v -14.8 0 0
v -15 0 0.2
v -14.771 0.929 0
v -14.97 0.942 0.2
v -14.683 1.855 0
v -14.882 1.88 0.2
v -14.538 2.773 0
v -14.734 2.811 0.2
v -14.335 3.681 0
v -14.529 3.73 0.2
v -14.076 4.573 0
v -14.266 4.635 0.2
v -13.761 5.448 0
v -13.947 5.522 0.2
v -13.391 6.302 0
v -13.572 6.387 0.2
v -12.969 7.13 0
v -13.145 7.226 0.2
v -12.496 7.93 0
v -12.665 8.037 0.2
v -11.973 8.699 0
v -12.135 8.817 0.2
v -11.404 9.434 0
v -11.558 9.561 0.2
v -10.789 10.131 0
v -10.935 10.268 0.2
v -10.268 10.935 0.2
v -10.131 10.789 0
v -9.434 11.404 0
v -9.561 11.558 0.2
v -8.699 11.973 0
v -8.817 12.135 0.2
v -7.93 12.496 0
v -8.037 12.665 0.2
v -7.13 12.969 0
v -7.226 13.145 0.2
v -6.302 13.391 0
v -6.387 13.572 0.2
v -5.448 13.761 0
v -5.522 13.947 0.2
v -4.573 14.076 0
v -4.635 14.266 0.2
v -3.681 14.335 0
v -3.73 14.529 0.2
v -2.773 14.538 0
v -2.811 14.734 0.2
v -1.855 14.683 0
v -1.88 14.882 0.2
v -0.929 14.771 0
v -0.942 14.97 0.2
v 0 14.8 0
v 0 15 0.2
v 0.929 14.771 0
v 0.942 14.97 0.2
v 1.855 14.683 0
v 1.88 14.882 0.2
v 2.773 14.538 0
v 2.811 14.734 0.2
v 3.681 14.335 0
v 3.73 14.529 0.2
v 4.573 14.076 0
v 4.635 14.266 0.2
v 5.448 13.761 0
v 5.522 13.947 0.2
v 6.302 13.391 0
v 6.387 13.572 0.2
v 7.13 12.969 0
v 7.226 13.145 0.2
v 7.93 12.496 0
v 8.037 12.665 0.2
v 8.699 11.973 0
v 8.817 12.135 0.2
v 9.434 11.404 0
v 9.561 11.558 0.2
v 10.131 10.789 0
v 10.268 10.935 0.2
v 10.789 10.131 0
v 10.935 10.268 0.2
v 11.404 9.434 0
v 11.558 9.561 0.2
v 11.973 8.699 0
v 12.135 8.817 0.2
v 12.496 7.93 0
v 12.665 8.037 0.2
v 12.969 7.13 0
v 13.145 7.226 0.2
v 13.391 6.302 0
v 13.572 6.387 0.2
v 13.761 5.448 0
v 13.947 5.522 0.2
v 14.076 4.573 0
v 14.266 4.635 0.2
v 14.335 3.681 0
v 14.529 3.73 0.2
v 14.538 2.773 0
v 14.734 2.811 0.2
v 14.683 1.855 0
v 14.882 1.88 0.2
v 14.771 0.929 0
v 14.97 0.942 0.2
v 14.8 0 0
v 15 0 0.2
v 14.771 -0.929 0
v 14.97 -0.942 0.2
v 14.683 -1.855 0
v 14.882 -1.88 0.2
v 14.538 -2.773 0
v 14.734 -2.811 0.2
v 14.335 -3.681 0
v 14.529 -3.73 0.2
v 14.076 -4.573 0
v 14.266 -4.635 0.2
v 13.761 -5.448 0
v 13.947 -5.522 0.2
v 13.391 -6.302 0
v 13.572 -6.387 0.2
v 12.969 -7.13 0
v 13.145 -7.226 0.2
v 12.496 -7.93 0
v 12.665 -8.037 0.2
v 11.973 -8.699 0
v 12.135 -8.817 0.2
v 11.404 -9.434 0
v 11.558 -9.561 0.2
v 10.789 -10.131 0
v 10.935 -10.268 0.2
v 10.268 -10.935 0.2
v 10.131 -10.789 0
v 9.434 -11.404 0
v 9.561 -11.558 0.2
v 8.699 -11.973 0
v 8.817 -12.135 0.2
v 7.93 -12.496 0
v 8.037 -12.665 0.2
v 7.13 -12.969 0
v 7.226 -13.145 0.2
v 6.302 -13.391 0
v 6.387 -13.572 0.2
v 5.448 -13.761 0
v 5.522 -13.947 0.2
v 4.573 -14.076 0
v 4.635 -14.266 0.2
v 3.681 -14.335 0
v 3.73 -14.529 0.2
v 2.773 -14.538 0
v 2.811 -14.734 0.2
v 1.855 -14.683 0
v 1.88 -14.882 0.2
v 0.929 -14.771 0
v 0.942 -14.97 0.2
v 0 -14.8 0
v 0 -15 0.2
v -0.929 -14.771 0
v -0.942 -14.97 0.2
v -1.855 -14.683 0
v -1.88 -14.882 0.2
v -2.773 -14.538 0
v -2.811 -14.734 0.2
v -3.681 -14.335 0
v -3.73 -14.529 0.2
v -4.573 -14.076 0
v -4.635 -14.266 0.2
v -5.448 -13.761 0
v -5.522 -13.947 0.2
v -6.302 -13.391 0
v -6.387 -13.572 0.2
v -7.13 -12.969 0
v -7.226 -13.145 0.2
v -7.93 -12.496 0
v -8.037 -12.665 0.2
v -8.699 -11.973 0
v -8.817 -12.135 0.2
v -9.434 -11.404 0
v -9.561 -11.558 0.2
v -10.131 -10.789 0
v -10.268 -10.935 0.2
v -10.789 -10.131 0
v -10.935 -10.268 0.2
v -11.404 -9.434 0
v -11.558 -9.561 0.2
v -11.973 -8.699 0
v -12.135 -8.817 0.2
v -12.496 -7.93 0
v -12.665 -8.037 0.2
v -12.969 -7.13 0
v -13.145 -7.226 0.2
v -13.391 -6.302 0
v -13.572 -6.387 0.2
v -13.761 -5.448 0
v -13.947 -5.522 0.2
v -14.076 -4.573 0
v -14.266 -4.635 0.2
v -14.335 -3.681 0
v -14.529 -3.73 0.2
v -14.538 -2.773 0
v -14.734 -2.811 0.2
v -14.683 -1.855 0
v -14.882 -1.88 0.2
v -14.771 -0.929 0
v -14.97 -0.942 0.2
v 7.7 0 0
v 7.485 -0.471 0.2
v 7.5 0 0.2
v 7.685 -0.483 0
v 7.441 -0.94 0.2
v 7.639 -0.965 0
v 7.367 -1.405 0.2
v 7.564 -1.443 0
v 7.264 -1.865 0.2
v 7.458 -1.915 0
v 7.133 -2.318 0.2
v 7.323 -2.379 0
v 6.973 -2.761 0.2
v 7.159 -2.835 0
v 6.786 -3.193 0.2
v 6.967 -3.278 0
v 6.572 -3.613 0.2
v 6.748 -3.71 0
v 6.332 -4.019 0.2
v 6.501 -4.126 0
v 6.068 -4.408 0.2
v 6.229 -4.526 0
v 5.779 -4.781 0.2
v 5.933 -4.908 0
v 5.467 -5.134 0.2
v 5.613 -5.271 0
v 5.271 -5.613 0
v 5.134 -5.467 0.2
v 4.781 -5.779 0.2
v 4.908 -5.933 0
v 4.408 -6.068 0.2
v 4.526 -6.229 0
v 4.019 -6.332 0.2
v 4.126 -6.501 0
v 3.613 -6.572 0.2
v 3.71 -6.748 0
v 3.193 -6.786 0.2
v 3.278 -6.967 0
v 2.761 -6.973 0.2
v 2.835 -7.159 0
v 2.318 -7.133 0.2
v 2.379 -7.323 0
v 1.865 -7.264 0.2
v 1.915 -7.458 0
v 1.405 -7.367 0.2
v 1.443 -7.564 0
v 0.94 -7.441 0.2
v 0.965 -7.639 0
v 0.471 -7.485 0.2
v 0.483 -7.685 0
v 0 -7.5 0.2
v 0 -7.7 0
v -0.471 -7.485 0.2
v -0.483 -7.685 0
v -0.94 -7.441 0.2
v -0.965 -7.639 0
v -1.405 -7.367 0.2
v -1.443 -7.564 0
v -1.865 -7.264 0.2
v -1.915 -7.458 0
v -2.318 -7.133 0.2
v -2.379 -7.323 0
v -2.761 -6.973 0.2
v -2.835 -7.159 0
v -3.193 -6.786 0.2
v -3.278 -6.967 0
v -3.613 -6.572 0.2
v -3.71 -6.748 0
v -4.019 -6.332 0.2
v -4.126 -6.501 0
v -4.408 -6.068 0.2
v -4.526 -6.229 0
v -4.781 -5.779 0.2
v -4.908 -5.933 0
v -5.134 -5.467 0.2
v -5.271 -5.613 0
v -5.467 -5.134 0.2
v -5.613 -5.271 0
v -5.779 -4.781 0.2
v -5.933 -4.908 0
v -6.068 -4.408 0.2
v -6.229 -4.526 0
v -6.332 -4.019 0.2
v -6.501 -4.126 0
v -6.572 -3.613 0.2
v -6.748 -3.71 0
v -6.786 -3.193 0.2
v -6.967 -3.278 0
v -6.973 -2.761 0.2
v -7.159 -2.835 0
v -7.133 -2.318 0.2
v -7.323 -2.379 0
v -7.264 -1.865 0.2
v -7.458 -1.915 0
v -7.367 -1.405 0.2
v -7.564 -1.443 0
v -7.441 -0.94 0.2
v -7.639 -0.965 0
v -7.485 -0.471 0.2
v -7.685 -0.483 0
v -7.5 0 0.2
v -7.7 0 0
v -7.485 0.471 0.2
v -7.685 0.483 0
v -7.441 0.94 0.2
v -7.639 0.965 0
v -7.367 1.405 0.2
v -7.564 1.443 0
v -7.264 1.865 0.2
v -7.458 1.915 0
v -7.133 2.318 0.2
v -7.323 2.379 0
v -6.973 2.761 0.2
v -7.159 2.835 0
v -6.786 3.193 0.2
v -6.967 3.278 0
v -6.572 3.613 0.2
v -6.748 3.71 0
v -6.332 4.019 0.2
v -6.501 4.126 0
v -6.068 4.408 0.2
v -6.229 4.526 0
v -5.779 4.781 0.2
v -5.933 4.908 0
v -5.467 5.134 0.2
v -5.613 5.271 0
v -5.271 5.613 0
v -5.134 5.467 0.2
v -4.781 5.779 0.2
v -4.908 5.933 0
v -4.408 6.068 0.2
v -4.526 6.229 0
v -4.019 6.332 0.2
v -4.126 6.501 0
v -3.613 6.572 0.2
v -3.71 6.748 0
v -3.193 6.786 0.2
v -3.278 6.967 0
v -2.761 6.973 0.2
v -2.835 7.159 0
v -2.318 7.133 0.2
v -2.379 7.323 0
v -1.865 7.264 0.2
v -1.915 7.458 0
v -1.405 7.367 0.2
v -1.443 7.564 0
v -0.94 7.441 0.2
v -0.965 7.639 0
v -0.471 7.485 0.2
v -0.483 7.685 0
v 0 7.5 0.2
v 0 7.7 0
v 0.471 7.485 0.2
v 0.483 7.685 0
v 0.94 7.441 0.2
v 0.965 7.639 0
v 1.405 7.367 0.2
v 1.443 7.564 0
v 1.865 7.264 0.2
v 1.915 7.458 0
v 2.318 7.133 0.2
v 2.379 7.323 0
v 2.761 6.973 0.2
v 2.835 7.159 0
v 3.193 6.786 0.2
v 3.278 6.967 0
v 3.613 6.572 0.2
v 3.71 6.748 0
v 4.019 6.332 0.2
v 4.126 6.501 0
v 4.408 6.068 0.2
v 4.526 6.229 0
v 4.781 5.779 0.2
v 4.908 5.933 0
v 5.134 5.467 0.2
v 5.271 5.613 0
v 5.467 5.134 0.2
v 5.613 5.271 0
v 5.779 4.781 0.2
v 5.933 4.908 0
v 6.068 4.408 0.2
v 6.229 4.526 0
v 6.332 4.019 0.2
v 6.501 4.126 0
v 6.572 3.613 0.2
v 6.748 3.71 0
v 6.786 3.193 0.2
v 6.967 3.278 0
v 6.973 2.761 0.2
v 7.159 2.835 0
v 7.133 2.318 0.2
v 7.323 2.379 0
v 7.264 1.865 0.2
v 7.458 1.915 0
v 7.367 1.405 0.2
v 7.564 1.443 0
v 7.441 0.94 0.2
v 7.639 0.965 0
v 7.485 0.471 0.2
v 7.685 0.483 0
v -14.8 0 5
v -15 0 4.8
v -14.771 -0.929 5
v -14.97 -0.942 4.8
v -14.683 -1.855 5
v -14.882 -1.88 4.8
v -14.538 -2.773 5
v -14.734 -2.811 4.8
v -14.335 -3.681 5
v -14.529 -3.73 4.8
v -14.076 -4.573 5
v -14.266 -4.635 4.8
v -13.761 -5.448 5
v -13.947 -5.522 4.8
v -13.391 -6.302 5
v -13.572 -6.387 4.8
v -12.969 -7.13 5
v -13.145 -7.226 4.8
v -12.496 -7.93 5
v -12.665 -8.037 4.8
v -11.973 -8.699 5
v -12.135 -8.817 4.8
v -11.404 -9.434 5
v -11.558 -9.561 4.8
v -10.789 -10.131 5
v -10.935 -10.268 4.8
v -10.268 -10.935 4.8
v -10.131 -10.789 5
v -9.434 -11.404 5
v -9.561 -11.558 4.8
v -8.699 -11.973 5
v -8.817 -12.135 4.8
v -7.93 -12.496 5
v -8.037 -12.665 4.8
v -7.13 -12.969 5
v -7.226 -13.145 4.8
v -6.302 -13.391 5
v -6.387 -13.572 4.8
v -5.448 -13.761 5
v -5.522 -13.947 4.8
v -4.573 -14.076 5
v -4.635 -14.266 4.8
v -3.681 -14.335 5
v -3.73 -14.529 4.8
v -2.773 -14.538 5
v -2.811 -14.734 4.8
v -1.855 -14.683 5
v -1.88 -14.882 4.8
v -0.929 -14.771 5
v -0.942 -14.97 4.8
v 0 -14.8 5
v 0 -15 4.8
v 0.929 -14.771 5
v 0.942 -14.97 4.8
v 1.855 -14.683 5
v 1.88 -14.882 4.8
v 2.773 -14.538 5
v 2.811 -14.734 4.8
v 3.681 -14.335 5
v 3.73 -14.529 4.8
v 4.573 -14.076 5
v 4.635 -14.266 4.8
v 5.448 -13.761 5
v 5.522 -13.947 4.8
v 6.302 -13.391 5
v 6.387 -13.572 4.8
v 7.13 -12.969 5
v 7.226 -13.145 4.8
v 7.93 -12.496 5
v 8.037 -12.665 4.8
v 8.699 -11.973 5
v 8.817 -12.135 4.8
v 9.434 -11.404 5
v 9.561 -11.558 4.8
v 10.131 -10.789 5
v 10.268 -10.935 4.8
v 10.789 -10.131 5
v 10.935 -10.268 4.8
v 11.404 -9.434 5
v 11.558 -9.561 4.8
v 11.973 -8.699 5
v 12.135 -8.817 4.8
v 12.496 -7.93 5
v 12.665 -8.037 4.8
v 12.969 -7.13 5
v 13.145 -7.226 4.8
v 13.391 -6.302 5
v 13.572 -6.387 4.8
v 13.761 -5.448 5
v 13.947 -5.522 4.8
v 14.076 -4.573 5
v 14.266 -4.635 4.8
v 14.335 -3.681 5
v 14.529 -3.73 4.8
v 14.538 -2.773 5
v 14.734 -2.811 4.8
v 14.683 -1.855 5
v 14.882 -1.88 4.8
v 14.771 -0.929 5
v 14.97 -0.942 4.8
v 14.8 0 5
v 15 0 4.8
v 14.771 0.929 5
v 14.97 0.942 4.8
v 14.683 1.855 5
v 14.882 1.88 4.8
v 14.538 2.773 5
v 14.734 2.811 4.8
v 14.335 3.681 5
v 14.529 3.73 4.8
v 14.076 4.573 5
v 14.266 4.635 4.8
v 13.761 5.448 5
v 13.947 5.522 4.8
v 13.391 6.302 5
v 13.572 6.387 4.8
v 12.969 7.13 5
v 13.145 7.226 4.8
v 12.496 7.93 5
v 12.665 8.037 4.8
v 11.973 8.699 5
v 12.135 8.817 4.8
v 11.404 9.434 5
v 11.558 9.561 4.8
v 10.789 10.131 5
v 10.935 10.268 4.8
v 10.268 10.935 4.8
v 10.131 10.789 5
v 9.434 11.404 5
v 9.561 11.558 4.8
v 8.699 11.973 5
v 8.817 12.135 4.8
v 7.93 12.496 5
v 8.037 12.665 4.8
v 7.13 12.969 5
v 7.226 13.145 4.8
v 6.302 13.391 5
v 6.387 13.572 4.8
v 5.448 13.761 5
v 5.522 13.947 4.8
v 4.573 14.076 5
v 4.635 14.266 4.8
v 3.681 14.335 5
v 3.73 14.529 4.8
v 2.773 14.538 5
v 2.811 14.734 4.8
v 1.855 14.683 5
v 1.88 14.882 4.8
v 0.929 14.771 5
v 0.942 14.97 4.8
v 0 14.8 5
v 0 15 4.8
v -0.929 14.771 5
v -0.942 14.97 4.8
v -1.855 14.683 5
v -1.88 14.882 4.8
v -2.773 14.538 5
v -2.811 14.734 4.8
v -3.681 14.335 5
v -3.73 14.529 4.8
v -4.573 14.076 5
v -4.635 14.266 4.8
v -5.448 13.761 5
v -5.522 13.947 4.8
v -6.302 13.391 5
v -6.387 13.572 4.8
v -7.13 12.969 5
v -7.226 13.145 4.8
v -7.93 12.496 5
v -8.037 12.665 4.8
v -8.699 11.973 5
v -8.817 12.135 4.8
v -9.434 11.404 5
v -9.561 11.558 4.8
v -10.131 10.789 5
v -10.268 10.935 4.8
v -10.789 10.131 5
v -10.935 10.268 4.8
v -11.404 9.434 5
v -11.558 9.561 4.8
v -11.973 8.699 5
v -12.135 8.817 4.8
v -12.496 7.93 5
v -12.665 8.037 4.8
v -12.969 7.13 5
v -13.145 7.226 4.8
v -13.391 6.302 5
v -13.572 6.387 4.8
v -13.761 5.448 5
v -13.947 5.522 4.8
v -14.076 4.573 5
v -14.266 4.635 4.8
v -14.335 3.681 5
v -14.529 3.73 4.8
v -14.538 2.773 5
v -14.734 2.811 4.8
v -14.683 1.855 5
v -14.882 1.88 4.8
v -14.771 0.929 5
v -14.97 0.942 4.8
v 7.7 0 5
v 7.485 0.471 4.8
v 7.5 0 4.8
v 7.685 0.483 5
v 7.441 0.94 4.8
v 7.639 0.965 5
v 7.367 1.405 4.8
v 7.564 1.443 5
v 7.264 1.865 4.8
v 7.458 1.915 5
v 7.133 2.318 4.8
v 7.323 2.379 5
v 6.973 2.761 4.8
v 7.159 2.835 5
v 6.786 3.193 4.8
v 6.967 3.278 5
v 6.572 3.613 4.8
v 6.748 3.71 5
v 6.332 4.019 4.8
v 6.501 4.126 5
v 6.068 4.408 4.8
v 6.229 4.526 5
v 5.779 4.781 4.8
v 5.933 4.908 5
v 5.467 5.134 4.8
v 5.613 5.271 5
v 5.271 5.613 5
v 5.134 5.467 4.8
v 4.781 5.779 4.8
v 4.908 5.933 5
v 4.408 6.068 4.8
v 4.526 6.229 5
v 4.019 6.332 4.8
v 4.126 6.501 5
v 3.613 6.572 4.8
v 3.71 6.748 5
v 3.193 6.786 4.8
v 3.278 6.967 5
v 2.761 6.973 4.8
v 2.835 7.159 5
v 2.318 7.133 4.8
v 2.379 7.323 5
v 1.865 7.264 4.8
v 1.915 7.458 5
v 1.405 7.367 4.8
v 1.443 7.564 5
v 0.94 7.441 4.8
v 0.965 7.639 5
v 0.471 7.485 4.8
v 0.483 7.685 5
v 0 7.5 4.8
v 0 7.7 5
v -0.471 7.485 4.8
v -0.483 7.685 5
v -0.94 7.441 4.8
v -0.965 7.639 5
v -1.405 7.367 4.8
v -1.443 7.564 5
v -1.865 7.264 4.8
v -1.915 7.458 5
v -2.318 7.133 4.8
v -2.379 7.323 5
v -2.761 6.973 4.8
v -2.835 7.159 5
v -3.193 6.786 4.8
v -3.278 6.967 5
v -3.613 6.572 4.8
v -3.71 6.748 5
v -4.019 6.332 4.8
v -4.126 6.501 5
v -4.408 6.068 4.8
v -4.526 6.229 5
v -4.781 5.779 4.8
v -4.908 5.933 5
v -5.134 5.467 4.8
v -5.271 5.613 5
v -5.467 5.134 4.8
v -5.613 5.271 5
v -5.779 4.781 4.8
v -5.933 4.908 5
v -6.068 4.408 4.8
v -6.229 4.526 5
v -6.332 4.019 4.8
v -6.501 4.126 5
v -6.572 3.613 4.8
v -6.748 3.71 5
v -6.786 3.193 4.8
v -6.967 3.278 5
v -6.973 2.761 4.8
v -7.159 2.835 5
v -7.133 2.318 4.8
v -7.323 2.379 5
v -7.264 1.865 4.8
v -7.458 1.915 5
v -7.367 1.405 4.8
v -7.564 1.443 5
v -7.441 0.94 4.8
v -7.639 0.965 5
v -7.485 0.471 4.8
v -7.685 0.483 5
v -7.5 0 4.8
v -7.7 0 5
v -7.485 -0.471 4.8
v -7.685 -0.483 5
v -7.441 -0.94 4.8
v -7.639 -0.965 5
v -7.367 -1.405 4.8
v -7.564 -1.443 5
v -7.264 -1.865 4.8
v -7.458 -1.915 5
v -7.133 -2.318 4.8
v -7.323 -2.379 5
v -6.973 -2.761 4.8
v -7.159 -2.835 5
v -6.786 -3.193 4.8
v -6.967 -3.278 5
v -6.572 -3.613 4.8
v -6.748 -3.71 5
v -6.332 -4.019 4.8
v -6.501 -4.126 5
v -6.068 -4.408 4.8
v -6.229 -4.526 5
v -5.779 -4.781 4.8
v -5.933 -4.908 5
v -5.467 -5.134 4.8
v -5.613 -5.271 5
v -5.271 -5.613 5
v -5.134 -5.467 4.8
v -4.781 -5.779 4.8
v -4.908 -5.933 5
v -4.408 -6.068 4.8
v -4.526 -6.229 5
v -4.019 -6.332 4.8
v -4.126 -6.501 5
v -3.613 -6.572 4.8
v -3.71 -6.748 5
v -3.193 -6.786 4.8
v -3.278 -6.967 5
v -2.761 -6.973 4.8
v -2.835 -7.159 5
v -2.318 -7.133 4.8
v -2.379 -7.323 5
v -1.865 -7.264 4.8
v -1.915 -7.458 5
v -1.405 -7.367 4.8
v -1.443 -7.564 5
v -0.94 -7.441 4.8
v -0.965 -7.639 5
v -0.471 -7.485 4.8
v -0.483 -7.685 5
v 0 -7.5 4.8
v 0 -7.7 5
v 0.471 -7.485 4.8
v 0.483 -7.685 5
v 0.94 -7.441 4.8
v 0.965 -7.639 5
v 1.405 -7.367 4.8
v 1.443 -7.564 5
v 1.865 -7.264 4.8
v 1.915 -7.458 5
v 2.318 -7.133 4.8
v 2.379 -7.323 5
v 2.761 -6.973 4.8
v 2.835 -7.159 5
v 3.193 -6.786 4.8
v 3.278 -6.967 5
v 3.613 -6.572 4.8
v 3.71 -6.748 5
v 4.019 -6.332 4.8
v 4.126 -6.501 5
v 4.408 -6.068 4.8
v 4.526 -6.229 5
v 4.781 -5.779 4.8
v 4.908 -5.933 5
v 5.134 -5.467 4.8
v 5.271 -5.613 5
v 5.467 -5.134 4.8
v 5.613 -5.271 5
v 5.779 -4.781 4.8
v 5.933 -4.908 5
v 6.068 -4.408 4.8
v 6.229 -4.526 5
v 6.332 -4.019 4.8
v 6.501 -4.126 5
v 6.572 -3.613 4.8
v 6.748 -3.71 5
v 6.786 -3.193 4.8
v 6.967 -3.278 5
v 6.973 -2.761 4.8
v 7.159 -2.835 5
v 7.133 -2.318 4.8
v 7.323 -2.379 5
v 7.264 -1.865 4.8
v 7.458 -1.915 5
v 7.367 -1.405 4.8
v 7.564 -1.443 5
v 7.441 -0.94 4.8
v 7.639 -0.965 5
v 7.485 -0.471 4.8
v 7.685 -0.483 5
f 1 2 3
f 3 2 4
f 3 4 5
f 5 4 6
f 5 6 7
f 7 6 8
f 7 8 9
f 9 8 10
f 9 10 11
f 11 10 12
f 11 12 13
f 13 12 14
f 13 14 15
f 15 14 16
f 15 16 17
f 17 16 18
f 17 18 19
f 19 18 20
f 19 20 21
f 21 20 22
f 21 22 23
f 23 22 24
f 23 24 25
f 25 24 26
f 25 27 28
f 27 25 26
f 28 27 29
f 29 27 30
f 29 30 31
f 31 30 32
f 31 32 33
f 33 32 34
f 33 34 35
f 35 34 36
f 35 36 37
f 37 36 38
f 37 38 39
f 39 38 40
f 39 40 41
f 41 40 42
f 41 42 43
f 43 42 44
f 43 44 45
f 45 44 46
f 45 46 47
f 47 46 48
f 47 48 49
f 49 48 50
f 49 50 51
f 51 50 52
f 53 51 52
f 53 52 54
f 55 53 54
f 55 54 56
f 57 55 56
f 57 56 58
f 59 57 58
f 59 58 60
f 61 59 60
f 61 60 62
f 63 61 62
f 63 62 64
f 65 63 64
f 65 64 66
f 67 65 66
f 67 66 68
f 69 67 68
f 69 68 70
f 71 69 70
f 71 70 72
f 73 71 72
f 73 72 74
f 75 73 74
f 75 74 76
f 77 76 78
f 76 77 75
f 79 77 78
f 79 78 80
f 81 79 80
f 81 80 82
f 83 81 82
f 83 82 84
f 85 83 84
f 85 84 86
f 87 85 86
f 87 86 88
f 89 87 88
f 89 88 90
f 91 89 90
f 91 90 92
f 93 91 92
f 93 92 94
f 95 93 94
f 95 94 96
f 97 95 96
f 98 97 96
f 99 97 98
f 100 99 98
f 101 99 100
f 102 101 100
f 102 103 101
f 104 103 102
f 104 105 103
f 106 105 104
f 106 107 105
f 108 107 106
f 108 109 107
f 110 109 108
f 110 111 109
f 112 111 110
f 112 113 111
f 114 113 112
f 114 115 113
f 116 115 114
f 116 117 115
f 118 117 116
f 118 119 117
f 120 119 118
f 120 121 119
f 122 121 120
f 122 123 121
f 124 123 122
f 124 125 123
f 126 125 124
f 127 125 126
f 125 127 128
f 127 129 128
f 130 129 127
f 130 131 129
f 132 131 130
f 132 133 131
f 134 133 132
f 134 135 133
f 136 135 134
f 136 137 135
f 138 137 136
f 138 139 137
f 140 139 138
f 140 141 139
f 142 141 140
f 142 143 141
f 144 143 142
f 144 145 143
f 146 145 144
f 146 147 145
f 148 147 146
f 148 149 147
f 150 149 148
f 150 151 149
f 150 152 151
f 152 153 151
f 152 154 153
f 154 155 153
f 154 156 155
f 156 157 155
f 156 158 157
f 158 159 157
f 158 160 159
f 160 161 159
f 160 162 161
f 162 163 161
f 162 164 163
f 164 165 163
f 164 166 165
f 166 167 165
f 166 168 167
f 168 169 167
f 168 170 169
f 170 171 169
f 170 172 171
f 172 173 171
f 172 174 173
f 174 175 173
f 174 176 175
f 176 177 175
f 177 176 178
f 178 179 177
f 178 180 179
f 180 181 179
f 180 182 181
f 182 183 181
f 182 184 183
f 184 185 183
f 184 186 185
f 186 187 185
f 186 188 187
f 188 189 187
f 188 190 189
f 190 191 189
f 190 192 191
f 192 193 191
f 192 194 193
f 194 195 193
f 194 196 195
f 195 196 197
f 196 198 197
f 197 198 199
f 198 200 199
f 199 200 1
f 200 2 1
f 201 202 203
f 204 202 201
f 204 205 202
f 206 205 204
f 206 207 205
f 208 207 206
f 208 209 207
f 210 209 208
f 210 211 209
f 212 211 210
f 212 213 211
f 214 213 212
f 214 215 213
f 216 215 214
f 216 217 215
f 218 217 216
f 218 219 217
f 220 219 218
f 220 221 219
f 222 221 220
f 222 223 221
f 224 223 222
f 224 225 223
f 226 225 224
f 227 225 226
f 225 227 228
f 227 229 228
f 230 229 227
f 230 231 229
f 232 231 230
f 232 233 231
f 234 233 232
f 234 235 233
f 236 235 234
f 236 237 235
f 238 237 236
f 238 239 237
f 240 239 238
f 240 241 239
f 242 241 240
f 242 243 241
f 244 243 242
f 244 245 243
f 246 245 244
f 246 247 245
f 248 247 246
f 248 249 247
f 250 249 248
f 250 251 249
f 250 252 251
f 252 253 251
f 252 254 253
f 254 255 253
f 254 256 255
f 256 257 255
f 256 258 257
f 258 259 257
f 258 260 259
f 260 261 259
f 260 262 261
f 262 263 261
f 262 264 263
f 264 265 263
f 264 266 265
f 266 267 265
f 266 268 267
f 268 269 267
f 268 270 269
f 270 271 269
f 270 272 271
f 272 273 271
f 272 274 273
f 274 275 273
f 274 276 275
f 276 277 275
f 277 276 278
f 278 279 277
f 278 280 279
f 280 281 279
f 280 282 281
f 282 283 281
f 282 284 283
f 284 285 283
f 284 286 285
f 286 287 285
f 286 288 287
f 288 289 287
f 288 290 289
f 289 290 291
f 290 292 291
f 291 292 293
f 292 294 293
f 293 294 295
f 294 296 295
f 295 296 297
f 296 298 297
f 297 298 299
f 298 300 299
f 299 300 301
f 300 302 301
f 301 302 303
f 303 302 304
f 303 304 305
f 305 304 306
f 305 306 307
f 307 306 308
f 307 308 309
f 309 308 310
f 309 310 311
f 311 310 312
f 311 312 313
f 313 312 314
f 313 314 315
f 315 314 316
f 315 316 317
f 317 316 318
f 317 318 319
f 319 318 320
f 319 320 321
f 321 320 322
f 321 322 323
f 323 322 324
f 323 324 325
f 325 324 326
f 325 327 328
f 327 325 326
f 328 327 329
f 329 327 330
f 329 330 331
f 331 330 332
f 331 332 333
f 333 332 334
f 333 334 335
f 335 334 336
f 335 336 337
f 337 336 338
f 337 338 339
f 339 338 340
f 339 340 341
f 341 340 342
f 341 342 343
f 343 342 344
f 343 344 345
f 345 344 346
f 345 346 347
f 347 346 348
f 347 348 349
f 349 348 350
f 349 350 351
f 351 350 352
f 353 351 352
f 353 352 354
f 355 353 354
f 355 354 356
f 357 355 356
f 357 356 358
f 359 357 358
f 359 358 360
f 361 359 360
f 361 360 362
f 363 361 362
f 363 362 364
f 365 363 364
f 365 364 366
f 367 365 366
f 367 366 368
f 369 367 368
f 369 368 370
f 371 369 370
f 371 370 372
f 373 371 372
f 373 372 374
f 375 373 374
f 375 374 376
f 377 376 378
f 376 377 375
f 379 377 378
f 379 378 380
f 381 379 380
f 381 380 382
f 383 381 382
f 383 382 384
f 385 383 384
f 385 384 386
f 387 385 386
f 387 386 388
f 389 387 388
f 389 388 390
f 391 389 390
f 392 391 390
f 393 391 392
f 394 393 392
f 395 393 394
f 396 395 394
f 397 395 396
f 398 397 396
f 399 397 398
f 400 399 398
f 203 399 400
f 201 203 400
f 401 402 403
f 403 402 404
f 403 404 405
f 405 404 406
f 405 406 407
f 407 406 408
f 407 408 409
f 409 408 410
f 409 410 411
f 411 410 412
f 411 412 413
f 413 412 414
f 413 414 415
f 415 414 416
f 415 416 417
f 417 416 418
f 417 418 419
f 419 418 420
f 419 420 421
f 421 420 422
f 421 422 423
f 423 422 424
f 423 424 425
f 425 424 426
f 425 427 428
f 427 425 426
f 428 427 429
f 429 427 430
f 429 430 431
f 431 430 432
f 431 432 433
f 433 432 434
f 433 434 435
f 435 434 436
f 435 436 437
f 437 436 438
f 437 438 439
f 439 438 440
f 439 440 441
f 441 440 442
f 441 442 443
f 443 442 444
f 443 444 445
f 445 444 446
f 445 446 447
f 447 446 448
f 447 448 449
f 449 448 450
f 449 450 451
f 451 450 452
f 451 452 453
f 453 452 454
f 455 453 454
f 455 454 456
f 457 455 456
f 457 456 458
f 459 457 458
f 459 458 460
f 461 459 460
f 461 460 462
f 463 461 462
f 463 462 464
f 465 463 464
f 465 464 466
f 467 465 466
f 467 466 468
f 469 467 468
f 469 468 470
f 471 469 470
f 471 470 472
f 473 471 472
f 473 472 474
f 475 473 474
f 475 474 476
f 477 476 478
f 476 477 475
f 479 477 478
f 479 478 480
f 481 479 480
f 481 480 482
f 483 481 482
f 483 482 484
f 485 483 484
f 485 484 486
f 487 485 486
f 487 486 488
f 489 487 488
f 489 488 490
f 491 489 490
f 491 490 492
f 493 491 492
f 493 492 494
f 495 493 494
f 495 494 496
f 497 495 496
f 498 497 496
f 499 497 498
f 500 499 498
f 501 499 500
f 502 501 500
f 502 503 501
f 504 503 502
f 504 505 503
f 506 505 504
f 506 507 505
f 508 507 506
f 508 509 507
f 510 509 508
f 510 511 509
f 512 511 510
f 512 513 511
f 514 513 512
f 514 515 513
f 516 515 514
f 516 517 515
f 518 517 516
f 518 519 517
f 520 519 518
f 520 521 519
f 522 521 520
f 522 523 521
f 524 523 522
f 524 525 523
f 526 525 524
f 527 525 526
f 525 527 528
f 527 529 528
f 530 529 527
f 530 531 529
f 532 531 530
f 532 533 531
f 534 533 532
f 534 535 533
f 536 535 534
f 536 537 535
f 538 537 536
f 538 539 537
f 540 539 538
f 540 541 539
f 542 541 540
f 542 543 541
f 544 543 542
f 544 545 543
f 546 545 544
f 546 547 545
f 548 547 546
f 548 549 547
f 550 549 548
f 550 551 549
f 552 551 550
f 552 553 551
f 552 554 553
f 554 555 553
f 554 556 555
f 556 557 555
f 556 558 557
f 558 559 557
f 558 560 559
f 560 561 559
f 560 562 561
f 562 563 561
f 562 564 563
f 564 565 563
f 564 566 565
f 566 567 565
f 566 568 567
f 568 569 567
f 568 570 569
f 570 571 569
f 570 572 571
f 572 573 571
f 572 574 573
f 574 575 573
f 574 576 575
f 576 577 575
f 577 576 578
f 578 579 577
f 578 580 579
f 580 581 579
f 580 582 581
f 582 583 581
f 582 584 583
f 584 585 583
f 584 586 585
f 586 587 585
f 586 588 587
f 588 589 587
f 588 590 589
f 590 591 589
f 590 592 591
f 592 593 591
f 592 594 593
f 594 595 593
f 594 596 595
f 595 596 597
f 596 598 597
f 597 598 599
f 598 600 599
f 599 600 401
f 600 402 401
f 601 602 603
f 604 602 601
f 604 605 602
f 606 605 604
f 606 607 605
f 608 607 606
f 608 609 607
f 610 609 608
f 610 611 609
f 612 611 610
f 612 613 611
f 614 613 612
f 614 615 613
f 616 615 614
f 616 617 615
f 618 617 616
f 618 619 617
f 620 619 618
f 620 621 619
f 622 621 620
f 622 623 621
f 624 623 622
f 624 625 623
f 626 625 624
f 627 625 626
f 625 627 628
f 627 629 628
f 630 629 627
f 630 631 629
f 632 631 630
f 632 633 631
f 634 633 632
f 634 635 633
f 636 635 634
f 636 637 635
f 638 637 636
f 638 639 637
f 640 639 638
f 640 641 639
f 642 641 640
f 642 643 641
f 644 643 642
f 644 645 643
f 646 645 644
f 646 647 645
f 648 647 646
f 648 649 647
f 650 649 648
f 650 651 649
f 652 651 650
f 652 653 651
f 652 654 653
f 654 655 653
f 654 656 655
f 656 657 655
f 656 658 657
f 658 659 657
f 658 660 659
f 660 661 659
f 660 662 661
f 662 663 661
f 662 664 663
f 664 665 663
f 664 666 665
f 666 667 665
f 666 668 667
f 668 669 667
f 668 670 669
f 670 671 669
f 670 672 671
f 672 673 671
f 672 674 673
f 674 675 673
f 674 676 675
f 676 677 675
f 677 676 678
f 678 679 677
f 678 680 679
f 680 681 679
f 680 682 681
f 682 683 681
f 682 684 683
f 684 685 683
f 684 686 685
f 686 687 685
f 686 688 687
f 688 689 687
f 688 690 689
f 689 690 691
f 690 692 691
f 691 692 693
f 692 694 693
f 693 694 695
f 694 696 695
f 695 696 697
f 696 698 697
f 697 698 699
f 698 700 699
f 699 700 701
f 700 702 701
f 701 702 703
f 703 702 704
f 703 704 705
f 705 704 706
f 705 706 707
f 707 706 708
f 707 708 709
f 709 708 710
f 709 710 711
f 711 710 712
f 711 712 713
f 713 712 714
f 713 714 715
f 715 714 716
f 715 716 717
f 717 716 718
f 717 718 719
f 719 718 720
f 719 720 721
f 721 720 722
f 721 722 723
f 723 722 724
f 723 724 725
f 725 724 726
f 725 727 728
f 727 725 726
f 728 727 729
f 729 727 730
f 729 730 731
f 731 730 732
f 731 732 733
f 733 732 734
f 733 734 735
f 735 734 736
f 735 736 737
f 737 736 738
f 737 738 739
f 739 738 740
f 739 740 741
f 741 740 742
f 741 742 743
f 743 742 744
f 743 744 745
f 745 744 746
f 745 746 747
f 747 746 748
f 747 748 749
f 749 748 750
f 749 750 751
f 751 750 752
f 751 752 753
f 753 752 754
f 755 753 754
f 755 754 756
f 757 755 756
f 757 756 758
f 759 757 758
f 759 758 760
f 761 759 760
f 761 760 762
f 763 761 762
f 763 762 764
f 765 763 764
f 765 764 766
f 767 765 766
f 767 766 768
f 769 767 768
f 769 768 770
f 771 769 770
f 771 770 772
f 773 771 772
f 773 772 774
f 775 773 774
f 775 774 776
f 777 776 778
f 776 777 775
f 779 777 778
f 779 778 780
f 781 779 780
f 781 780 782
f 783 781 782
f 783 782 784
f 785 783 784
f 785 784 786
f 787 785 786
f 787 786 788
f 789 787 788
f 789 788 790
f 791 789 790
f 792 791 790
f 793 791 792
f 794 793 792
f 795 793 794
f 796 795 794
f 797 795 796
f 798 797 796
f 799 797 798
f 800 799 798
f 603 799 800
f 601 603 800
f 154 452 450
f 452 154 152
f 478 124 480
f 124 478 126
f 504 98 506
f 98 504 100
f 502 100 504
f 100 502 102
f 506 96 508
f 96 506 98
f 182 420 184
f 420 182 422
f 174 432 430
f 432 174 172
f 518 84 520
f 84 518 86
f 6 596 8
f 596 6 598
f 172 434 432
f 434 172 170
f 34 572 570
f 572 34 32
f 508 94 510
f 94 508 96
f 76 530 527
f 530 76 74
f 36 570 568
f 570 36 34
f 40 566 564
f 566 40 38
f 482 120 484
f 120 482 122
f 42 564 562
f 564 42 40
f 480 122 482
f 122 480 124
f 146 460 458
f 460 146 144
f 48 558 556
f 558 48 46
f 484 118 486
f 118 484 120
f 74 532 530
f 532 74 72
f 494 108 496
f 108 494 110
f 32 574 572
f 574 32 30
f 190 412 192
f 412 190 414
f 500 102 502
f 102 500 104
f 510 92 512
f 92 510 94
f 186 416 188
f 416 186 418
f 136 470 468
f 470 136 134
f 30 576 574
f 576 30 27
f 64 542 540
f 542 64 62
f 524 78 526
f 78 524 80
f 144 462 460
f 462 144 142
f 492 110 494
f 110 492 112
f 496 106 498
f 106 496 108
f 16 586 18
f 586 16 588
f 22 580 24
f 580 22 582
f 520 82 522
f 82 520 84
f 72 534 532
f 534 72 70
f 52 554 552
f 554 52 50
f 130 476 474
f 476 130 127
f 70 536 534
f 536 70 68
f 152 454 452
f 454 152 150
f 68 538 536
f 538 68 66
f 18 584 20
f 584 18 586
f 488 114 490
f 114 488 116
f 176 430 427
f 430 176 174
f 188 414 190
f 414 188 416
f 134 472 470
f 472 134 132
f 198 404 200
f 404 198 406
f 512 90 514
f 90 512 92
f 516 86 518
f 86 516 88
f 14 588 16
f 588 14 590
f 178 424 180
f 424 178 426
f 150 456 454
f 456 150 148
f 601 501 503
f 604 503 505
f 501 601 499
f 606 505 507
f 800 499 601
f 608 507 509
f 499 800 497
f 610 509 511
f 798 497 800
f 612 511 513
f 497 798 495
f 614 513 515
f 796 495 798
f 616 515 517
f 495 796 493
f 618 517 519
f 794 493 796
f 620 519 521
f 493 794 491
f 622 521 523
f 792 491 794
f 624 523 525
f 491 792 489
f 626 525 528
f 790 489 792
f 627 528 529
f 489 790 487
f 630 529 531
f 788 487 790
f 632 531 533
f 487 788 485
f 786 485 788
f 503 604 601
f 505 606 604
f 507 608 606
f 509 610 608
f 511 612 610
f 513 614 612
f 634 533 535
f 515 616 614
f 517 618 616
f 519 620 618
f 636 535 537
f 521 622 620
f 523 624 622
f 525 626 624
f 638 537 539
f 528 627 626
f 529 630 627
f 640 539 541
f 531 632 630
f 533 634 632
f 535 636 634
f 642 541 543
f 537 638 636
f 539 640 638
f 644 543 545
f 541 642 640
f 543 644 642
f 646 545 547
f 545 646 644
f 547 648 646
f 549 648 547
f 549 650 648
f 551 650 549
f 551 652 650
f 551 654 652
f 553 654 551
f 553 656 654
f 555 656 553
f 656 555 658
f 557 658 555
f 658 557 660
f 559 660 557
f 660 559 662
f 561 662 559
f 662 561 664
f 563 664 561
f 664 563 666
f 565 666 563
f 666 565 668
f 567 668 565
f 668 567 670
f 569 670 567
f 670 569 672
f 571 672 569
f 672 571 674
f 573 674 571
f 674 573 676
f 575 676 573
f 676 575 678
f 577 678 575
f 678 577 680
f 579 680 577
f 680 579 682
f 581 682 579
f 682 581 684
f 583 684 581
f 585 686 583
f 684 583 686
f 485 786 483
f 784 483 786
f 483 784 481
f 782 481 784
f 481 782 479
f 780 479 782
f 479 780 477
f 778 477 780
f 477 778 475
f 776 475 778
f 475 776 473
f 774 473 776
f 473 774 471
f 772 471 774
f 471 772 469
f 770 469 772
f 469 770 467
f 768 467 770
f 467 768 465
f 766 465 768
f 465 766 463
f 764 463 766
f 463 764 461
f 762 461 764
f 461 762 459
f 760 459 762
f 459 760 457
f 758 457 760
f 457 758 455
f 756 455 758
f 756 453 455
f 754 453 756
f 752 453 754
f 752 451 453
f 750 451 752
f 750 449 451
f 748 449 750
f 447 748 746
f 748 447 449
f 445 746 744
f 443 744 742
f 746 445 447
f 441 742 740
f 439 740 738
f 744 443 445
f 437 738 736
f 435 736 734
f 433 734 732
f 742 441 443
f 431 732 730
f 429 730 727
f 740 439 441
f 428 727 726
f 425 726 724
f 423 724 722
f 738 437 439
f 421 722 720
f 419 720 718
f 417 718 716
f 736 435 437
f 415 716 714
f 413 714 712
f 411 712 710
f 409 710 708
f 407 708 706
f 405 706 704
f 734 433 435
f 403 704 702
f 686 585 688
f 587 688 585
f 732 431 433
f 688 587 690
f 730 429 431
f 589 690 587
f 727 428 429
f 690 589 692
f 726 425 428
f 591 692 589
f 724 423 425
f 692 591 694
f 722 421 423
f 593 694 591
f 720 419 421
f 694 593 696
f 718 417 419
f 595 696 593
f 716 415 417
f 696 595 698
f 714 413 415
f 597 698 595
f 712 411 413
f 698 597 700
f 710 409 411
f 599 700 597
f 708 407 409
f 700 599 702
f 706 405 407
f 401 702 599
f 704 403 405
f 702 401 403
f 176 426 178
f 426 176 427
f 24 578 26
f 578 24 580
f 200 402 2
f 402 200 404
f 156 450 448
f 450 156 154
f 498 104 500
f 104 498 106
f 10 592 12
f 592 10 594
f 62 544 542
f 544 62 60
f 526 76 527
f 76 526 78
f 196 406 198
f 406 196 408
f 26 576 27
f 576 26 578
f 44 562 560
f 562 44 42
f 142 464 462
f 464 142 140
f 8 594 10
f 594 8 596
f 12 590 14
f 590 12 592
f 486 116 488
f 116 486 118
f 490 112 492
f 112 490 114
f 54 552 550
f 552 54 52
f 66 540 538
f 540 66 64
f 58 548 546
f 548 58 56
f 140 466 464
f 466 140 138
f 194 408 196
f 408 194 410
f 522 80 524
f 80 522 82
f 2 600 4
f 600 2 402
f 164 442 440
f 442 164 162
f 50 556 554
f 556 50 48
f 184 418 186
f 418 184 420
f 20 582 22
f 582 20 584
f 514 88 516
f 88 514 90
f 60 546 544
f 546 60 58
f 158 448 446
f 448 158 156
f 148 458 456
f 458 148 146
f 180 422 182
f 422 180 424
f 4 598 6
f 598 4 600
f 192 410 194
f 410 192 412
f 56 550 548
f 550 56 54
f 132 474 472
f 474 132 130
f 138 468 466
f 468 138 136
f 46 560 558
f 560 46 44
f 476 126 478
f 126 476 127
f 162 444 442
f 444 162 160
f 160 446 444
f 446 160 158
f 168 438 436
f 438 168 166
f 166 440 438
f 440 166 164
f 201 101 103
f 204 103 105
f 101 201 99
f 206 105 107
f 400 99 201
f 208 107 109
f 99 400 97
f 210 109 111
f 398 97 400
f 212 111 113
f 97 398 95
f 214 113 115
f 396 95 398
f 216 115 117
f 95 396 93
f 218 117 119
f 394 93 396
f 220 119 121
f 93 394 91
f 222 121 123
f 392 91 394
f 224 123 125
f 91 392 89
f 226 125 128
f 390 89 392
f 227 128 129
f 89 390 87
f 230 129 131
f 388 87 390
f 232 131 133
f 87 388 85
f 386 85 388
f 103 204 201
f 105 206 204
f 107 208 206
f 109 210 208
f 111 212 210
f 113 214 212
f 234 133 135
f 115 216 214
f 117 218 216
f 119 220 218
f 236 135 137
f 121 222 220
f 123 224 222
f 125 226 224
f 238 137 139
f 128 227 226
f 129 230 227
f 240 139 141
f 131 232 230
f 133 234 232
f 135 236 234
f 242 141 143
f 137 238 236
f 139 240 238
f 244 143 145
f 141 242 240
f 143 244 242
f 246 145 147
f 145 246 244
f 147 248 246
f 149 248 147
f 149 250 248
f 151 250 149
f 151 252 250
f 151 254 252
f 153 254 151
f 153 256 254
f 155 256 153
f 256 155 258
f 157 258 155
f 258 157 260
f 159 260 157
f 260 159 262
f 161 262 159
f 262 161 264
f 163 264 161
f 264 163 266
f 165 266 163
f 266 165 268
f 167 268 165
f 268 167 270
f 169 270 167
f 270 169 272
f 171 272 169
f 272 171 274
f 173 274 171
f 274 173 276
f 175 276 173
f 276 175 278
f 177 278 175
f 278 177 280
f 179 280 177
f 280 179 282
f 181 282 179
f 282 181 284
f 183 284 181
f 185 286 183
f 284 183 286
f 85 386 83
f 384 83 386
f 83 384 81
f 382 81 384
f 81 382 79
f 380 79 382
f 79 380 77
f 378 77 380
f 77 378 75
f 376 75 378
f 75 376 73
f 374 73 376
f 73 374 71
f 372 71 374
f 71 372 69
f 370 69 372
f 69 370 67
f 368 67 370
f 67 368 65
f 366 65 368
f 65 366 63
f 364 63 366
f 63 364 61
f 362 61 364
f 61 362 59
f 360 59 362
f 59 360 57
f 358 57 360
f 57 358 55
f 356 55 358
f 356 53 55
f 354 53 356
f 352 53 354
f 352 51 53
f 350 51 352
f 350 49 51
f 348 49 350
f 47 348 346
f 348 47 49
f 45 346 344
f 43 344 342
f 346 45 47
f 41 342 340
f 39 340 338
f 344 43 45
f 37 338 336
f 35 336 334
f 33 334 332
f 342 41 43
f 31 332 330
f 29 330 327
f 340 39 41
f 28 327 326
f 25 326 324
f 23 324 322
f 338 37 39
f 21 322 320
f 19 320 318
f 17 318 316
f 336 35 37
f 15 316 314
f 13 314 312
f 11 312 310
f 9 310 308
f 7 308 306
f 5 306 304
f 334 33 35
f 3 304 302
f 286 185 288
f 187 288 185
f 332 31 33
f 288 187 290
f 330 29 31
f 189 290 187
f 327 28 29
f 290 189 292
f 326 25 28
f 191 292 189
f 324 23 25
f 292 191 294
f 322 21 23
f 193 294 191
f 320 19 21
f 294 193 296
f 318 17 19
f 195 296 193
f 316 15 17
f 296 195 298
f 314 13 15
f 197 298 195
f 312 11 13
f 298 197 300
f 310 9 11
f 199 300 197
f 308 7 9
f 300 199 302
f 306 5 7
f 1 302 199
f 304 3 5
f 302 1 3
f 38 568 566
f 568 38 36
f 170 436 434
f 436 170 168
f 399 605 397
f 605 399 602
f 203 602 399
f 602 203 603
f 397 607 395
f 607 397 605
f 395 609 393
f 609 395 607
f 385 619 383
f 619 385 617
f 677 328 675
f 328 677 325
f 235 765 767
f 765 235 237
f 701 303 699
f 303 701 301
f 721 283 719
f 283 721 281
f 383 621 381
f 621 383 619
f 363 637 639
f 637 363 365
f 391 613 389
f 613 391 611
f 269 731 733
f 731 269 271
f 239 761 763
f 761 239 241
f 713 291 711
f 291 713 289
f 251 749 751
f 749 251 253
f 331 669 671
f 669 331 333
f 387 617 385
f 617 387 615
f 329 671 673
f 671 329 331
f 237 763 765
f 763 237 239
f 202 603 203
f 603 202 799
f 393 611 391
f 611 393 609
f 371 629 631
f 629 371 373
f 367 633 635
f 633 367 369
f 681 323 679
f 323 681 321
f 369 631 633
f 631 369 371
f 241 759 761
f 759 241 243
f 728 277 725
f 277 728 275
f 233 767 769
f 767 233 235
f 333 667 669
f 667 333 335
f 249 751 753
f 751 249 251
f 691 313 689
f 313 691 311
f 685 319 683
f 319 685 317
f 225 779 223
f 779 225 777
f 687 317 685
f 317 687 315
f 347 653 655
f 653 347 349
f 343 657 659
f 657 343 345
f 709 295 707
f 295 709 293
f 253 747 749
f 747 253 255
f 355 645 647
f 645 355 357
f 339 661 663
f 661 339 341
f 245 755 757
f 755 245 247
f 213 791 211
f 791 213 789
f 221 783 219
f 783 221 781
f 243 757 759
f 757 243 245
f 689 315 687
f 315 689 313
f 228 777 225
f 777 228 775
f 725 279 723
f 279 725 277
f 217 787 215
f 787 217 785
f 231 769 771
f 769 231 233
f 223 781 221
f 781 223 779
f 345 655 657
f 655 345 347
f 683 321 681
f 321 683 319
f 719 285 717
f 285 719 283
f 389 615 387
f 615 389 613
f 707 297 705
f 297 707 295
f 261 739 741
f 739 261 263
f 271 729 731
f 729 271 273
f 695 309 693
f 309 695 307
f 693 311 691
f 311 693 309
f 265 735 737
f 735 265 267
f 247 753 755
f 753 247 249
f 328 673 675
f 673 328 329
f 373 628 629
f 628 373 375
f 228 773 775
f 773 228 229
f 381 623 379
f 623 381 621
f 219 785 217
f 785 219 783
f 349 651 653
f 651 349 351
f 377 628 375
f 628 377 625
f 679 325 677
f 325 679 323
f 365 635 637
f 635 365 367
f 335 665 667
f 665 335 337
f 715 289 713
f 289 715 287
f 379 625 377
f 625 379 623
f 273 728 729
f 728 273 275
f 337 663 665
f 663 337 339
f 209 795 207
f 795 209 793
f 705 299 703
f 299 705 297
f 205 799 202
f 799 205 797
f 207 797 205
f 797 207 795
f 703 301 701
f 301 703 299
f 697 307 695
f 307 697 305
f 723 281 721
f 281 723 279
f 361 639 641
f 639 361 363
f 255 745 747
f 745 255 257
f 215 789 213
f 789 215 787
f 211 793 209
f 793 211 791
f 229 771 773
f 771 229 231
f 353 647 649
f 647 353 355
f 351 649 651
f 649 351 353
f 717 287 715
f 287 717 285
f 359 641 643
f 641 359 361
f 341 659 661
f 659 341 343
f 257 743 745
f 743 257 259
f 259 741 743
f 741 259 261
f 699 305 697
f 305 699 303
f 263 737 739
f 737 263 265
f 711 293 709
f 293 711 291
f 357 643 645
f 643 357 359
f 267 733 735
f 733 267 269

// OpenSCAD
// bushing.scad

// library for parametric washer, bushing, spacer, ring or gasket 
// with chamfers and optional flange
// compare to flanged bushings at https://www.mcmaster.com/flanged-bushings/
//
// Remixed from Tony Z. Tonchev's washer.scad
// to add chamfers and flanges
// 
// Based on washer.scad from 
// https://www.thingiverse.com/thing:3183449
// Author: Tony Z. Tonchev, Michigan (USA) 
// last update: October 2018

//https://www.thingiverse.com/thing:5577366
Instructions = "";// ["Chamfered Bushing, parametric, flange optional","1) Choose an ID, Length, and OD.","2) For a flange, choose a non-zero Flange Thickness & Flange OD > OD","(Based on https://www.thingiverse.com/thing:3183449)"]

// (in mm)
Inside_Diameter = 15; //0.1

// (in mm)
Length = 5; //0.1

// (in mm)
Outside_Diameter = 30; //0.1

// <OD is no flange
Flange_OD = 0; //0.1

// 0 is no flange
Flange_Thickness =0; //0.1

//corner break
Break = 0.2; //0.1


/* [advanced] */

// number of facets
$fn=100;
// overlap 
eps=0.001;


chamfered_bushing(Inside_Diameter, Length, Outside_Diameter, Flange_OD, Flange_Thickness, Break);


module chamfered_bushing (di=15, h=5, do=30, fod=0, fh=0, break=0.2) {
    ro=do/2;
    ri=di/2;
    fr = fod/2;
    translate([0,0,h/2])
        difference () {
          union(){
            cylinder (h, ro, ro, true);
            if(fod != 0)translate([0,0,-h/2+fh/2+eps])cylinder(h=fh,d=fod,center=true);
        }
        cylinder (h+2*eps, ri, ri, true);
        if(Break != 0 ){
            translate([0,0,-h/2]){
                break_circular(r=(fod<ro?ro:fod/2),break=break);
                break_circular(r=-ri,break=break);}
            translate([0,0,h/2])rotate([180,0,0]){
                break_circular(r=ro,break=break);
                break_circular(r=-ri,break=break);}
        if(fod>do && fh > 0)
            translate([0,0,-h/2+fh])rotate([180,0,0])break_circular(r=fod/2,break=break);
        }
        }
}

module break_circular(r=10,angle=360,break=0.5,margin=0.5,draft=45){
      rotate_extrude(angle=angle)
        translate([r,0,0])
            chamfer_polygon(break = break,margin = margin,draft=draft);
      
  }


module chamfer_polygon(break=1,margin=1,thickness=1,draft=3)
    polygon(chamfer_points(break=break,margin=margin,thickness=thickness,draft=draft)); 

function chamfer_points(break=1,margin=1,thickness=1,draft=3) = [
        [thickness,-thickness],
        [-margin,-thickness],
        [-margin,-margin*sin(draft)],
        [-break,0],
        [0,break],
        [margin*sin(draft),margin],
        [thickness,margin]
    ];



if (0){
    dos = [10,15,20];
    dis = [1,5,9];
    for( i=[0,1,2],j=[0,1,2])
    translate([i*30,j*30,0])chamfered_bushing(h=(dos[i]+dis[j])%7+1,do=dos[i],di=dis[j],break=.2);
    
}
